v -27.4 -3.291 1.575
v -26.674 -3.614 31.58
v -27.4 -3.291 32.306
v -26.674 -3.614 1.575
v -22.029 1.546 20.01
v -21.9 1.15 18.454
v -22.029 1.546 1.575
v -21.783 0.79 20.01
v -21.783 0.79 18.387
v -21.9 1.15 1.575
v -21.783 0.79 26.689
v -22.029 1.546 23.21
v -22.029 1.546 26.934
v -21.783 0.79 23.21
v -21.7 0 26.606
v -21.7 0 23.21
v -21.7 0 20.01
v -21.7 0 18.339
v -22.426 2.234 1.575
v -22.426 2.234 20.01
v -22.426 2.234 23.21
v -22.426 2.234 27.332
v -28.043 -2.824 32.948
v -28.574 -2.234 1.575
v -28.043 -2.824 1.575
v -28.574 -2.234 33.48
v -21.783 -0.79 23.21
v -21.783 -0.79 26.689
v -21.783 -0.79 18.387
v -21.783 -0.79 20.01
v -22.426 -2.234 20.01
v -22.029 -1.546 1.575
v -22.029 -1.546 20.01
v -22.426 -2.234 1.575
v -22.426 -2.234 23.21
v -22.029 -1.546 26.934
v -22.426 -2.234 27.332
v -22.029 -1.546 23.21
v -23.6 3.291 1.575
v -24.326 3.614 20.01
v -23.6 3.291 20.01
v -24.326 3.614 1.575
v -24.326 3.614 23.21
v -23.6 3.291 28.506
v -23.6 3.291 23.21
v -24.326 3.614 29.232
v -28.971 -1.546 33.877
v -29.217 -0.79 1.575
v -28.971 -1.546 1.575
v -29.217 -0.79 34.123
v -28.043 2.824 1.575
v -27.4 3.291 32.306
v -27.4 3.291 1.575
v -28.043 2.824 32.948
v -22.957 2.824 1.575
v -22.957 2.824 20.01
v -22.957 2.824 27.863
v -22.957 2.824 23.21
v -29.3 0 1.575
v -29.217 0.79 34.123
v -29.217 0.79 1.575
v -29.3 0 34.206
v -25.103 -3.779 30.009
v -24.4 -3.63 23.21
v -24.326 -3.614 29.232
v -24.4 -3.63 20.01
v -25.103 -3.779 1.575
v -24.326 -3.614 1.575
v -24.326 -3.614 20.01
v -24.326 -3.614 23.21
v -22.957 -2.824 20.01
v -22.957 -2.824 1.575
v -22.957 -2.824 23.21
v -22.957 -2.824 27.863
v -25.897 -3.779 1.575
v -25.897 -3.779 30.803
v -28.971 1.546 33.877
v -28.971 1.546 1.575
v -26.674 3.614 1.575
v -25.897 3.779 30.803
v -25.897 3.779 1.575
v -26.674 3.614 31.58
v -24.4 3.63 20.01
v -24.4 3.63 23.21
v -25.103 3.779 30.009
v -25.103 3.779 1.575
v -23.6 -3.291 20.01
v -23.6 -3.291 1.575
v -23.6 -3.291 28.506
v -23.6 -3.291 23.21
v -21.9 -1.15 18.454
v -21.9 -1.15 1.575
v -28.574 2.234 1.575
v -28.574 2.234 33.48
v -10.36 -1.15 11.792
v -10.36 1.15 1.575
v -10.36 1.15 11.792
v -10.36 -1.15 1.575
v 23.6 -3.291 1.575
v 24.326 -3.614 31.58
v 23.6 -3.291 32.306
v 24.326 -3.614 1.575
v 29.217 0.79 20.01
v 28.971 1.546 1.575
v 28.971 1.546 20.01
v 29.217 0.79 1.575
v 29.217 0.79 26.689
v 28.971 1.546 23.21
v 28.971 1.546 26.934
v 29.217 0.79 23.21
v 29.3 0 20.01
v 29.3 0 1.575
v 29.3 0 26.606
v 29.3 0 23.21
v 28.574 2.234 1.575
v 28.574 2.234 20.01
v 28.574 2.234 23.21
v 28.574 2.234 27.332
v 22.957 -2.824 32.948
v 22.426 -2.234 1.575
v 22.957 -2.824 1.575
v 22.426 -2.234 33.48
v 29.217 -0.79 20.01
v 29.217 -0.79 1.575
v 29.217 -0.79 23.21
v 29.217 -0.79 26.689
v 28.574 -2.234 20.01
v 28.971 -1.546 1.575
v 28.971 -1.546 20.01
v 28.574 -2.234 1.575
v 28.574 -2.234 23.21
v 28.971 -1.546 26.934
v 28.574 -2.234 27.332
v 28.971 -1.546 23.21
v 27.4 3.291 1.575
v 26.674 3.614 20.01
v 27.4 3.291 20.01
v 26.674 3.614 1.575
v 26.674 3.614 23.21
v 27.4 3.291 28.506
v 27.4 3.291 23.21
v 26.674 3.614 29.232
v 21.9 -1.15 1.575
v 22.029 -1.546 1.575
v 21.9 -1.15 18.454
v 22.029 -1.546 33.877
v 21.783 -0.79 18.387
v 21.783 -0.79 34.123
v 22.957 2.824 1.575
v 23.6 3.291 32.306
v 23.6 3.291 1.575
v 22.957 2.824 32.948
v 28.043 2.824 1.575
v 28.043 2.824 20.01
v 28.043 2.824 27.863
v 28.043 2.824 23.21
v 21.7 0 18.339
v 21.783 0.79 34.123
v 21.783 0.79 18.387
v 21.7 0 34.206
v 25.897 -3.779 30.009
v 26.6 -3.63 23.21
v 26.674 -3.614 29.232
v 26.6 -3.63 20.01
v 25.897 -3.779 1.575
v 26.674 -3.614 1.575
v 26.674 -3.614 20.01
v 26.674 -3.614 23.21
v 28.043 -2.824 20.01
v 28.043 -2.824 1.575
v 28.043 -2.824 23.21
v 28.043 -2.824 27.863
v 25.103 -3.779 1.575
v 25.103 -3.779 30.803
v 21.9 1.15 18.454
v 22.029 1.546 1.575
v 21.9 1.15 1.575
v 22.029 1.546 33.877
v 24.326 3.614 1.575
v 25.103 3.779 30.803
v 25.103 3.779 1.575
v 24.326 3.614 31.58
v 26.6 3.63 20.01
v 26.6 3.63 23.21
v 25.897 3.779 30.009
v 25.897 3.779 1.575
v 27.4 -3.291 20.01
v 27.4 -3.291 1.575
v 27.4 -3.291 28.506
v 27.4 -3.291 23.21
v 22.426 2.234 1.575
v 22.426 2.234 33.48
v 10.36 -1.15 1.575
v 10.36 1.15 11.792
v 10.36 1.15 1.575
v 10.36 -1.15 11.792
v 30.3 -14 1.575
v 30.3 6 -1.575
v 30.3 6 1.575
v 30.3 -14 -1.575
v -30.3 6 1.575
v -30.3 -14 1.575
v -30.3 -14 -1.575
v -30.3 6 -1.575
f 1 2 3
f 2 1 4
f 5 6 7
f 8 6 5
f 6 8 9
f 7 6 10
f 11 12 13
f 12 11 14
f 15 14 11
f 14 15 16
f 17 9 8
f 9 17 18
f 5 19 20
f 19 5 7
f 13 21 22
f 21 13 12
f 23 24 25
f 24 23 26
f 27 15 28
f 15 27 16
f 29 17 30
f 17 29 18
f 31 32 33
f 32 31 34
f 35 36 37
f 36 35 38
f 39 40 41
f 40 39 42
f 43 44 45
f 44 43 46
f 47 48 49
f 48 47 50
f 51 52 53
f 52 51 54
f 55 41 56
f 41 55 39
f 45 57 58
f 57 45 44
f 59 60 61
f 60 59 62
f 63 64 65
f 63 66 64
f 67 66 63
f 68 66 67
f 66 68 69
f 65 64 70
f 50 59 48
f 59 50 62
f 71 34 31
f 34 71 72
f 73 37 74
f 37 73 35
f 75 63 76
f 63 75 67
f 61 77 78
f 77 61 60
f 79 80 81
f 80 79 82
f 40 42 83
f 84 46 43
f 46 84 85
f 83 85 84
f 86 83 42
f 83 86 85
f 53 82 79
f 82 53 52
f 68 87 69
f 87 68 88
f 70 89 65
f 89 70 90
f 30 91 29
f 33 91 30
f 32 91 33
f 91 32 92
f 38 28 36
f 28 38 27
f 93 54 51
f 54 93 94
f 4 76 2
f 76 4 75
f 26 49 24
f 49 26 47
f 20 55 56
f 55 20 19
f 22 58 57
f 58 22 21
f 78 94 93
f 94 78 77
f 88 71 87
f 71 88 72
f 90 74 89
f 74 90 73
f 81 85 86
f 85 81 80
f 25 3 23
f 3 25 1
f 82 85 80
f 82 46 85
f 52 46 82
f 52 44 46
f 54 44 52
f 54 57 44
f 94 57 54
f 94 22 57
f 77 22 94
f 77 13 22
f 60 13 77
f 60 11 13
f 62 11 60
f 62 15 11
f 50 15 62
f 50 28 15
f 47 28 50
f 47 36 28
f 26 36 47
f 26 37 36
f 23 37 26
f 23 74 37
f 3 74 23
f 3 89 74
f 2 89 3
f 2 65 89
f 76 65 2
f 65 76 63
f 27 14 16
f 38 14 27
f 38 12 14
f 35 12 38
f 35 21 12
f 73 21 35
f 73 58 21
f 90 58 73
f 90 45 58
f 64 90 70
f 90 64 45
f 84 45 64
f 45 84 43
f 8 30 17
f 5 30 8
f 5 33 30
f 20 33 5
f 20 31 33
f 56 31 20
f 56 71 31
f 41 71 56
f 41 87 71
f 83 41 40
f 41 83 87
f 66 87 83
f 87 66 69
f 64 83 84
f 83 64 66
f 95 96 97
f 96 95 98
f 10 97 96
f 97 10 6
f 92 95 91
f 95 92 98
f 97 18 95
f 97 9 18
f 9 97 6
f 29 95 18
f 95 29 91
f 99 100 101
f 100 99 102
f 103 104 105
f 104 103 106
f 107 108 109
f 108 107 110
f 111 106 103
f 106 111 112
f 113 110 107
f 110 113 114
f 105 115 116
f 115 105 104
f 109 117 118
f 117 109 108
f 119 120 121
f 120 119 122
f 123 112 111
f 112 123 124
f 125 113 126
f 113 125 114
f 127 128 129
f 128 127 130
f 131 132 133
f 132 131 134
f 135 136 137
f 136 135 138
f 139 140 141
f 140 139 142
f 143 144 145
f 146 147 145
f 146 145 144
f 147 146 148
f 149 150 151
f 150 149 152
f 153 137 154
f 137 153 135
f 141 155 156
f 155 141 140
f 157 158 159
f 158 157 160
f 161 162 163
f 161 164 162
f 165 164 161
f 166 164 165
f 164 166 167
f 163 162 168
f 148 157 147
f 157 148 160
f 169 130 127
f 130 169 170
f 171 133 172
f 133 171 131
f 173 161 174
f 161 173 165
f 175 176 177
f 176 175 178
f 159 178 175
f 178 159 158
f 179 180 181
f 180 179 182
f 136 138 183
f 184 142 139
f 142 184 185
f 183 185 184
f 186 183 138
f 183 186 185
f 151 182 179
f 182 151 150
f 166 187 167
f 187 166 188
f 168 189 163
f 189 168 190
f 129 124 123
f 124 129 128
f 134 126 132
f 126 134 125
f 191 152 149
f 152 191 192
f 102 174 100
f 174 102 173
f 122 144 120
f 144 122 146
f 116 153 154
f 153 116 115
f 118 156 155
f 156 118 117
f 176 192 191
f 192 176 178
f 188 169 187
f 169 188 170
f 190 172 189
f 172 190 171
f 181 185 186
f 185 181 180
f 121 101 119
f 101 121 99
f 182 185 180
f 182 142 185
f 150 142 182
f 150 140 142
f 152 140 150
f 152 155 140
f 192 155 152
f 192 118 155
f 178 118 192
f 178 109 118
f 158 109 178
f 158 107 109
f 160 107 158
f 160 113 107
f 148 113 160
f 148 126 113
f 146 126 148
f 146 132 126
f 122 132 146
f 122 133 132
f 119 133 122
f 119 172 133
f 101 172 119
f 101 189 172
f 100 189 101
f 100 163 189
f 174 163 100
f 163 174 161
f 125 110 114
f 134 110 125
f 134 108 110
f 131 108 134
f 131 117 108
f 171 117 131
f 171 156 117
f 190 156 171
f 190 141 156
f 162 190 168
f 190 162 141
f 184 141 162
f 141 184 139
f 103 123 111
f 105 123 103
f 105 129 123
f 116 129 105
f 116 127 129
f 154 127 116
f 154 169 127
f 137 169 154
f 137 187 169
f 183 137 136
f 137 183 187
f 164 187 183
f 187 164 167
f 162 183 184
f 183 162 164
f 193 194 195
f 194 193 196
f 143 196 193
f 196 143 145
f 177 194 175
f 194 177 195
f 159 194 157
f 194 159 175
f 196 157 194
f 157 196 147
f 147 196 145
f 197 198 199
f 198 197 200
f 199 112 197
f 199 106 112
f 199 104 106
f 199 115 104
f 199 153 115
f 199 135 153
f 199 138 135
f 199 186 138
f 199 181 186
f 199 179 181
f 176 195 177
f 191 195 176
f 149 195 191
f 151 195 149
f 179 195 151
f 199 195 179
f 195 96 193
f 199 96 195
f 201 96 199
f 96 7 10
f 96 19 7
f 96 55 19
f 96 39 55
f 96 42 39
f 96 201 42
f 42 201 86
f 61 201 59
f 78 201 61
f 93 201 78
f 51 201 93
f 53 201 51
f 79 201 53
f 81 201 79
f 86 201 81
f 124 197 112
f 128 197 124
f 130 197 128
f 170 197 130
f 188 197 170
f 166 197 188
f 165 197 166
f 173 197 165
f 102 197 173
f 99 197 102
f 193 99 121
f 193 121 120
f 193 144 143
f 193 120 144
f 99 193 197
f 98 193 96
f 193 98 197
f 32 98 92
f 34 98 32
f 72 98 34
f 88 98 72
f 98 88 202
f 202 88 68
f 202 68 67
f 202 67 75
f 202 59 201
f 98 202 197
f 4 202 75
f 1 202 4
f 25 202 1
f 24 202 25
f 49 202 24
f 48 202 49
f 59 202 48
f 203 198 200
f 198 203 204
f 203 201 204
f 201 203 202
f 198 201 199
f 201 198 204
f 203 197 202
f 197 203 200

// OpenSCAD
// pin

d = 6.76; d = 7.6;
l = 31.5; l = 32.5; l = 32.5 + 1.71;
s = 47.61; s = 50; s=51;

// flange

fw = 15.14;
fh = 19.39;
ft = 2.3;

// notch

nz = 12.6; 
nw = 3.2;
nd = 0.8;

// plate

pw = 41.5; pw = s + d + 2;
ph = 20.0;
pt = 3.15;

// platform

tl = 199;
tw = 87;
td = 10.25;


module pin () {
    $fn = 30;
    difference() {
        cylinder(l, d=d, true);
        translate([d/2,0,l])
            rotate([0,45,0])
                cube(d*1.415, true);
        translate([d/2-nd,0,l-nz])
            cube([d/2,d,nw], true);
    }
}

module flange() {
    translate([0,-ft/2,0])
        difference() {
            cube([fw,ft,fh]);
            translate([-1,-.1,l-nz-0.5])
                rotate([0,30,0])
                    cube([22,ft+.2,fh]);
        }
}

module plate() {
    translate([0,-ph/5,0])
        cube([pw,ph,pt], true);
}

translate([-s/2,0,0]) {
    pin();
    flange();
}

translate([s/2,0,0]) {
    pin();
    rotate([0,0,180])
        flange();
}

plate();
